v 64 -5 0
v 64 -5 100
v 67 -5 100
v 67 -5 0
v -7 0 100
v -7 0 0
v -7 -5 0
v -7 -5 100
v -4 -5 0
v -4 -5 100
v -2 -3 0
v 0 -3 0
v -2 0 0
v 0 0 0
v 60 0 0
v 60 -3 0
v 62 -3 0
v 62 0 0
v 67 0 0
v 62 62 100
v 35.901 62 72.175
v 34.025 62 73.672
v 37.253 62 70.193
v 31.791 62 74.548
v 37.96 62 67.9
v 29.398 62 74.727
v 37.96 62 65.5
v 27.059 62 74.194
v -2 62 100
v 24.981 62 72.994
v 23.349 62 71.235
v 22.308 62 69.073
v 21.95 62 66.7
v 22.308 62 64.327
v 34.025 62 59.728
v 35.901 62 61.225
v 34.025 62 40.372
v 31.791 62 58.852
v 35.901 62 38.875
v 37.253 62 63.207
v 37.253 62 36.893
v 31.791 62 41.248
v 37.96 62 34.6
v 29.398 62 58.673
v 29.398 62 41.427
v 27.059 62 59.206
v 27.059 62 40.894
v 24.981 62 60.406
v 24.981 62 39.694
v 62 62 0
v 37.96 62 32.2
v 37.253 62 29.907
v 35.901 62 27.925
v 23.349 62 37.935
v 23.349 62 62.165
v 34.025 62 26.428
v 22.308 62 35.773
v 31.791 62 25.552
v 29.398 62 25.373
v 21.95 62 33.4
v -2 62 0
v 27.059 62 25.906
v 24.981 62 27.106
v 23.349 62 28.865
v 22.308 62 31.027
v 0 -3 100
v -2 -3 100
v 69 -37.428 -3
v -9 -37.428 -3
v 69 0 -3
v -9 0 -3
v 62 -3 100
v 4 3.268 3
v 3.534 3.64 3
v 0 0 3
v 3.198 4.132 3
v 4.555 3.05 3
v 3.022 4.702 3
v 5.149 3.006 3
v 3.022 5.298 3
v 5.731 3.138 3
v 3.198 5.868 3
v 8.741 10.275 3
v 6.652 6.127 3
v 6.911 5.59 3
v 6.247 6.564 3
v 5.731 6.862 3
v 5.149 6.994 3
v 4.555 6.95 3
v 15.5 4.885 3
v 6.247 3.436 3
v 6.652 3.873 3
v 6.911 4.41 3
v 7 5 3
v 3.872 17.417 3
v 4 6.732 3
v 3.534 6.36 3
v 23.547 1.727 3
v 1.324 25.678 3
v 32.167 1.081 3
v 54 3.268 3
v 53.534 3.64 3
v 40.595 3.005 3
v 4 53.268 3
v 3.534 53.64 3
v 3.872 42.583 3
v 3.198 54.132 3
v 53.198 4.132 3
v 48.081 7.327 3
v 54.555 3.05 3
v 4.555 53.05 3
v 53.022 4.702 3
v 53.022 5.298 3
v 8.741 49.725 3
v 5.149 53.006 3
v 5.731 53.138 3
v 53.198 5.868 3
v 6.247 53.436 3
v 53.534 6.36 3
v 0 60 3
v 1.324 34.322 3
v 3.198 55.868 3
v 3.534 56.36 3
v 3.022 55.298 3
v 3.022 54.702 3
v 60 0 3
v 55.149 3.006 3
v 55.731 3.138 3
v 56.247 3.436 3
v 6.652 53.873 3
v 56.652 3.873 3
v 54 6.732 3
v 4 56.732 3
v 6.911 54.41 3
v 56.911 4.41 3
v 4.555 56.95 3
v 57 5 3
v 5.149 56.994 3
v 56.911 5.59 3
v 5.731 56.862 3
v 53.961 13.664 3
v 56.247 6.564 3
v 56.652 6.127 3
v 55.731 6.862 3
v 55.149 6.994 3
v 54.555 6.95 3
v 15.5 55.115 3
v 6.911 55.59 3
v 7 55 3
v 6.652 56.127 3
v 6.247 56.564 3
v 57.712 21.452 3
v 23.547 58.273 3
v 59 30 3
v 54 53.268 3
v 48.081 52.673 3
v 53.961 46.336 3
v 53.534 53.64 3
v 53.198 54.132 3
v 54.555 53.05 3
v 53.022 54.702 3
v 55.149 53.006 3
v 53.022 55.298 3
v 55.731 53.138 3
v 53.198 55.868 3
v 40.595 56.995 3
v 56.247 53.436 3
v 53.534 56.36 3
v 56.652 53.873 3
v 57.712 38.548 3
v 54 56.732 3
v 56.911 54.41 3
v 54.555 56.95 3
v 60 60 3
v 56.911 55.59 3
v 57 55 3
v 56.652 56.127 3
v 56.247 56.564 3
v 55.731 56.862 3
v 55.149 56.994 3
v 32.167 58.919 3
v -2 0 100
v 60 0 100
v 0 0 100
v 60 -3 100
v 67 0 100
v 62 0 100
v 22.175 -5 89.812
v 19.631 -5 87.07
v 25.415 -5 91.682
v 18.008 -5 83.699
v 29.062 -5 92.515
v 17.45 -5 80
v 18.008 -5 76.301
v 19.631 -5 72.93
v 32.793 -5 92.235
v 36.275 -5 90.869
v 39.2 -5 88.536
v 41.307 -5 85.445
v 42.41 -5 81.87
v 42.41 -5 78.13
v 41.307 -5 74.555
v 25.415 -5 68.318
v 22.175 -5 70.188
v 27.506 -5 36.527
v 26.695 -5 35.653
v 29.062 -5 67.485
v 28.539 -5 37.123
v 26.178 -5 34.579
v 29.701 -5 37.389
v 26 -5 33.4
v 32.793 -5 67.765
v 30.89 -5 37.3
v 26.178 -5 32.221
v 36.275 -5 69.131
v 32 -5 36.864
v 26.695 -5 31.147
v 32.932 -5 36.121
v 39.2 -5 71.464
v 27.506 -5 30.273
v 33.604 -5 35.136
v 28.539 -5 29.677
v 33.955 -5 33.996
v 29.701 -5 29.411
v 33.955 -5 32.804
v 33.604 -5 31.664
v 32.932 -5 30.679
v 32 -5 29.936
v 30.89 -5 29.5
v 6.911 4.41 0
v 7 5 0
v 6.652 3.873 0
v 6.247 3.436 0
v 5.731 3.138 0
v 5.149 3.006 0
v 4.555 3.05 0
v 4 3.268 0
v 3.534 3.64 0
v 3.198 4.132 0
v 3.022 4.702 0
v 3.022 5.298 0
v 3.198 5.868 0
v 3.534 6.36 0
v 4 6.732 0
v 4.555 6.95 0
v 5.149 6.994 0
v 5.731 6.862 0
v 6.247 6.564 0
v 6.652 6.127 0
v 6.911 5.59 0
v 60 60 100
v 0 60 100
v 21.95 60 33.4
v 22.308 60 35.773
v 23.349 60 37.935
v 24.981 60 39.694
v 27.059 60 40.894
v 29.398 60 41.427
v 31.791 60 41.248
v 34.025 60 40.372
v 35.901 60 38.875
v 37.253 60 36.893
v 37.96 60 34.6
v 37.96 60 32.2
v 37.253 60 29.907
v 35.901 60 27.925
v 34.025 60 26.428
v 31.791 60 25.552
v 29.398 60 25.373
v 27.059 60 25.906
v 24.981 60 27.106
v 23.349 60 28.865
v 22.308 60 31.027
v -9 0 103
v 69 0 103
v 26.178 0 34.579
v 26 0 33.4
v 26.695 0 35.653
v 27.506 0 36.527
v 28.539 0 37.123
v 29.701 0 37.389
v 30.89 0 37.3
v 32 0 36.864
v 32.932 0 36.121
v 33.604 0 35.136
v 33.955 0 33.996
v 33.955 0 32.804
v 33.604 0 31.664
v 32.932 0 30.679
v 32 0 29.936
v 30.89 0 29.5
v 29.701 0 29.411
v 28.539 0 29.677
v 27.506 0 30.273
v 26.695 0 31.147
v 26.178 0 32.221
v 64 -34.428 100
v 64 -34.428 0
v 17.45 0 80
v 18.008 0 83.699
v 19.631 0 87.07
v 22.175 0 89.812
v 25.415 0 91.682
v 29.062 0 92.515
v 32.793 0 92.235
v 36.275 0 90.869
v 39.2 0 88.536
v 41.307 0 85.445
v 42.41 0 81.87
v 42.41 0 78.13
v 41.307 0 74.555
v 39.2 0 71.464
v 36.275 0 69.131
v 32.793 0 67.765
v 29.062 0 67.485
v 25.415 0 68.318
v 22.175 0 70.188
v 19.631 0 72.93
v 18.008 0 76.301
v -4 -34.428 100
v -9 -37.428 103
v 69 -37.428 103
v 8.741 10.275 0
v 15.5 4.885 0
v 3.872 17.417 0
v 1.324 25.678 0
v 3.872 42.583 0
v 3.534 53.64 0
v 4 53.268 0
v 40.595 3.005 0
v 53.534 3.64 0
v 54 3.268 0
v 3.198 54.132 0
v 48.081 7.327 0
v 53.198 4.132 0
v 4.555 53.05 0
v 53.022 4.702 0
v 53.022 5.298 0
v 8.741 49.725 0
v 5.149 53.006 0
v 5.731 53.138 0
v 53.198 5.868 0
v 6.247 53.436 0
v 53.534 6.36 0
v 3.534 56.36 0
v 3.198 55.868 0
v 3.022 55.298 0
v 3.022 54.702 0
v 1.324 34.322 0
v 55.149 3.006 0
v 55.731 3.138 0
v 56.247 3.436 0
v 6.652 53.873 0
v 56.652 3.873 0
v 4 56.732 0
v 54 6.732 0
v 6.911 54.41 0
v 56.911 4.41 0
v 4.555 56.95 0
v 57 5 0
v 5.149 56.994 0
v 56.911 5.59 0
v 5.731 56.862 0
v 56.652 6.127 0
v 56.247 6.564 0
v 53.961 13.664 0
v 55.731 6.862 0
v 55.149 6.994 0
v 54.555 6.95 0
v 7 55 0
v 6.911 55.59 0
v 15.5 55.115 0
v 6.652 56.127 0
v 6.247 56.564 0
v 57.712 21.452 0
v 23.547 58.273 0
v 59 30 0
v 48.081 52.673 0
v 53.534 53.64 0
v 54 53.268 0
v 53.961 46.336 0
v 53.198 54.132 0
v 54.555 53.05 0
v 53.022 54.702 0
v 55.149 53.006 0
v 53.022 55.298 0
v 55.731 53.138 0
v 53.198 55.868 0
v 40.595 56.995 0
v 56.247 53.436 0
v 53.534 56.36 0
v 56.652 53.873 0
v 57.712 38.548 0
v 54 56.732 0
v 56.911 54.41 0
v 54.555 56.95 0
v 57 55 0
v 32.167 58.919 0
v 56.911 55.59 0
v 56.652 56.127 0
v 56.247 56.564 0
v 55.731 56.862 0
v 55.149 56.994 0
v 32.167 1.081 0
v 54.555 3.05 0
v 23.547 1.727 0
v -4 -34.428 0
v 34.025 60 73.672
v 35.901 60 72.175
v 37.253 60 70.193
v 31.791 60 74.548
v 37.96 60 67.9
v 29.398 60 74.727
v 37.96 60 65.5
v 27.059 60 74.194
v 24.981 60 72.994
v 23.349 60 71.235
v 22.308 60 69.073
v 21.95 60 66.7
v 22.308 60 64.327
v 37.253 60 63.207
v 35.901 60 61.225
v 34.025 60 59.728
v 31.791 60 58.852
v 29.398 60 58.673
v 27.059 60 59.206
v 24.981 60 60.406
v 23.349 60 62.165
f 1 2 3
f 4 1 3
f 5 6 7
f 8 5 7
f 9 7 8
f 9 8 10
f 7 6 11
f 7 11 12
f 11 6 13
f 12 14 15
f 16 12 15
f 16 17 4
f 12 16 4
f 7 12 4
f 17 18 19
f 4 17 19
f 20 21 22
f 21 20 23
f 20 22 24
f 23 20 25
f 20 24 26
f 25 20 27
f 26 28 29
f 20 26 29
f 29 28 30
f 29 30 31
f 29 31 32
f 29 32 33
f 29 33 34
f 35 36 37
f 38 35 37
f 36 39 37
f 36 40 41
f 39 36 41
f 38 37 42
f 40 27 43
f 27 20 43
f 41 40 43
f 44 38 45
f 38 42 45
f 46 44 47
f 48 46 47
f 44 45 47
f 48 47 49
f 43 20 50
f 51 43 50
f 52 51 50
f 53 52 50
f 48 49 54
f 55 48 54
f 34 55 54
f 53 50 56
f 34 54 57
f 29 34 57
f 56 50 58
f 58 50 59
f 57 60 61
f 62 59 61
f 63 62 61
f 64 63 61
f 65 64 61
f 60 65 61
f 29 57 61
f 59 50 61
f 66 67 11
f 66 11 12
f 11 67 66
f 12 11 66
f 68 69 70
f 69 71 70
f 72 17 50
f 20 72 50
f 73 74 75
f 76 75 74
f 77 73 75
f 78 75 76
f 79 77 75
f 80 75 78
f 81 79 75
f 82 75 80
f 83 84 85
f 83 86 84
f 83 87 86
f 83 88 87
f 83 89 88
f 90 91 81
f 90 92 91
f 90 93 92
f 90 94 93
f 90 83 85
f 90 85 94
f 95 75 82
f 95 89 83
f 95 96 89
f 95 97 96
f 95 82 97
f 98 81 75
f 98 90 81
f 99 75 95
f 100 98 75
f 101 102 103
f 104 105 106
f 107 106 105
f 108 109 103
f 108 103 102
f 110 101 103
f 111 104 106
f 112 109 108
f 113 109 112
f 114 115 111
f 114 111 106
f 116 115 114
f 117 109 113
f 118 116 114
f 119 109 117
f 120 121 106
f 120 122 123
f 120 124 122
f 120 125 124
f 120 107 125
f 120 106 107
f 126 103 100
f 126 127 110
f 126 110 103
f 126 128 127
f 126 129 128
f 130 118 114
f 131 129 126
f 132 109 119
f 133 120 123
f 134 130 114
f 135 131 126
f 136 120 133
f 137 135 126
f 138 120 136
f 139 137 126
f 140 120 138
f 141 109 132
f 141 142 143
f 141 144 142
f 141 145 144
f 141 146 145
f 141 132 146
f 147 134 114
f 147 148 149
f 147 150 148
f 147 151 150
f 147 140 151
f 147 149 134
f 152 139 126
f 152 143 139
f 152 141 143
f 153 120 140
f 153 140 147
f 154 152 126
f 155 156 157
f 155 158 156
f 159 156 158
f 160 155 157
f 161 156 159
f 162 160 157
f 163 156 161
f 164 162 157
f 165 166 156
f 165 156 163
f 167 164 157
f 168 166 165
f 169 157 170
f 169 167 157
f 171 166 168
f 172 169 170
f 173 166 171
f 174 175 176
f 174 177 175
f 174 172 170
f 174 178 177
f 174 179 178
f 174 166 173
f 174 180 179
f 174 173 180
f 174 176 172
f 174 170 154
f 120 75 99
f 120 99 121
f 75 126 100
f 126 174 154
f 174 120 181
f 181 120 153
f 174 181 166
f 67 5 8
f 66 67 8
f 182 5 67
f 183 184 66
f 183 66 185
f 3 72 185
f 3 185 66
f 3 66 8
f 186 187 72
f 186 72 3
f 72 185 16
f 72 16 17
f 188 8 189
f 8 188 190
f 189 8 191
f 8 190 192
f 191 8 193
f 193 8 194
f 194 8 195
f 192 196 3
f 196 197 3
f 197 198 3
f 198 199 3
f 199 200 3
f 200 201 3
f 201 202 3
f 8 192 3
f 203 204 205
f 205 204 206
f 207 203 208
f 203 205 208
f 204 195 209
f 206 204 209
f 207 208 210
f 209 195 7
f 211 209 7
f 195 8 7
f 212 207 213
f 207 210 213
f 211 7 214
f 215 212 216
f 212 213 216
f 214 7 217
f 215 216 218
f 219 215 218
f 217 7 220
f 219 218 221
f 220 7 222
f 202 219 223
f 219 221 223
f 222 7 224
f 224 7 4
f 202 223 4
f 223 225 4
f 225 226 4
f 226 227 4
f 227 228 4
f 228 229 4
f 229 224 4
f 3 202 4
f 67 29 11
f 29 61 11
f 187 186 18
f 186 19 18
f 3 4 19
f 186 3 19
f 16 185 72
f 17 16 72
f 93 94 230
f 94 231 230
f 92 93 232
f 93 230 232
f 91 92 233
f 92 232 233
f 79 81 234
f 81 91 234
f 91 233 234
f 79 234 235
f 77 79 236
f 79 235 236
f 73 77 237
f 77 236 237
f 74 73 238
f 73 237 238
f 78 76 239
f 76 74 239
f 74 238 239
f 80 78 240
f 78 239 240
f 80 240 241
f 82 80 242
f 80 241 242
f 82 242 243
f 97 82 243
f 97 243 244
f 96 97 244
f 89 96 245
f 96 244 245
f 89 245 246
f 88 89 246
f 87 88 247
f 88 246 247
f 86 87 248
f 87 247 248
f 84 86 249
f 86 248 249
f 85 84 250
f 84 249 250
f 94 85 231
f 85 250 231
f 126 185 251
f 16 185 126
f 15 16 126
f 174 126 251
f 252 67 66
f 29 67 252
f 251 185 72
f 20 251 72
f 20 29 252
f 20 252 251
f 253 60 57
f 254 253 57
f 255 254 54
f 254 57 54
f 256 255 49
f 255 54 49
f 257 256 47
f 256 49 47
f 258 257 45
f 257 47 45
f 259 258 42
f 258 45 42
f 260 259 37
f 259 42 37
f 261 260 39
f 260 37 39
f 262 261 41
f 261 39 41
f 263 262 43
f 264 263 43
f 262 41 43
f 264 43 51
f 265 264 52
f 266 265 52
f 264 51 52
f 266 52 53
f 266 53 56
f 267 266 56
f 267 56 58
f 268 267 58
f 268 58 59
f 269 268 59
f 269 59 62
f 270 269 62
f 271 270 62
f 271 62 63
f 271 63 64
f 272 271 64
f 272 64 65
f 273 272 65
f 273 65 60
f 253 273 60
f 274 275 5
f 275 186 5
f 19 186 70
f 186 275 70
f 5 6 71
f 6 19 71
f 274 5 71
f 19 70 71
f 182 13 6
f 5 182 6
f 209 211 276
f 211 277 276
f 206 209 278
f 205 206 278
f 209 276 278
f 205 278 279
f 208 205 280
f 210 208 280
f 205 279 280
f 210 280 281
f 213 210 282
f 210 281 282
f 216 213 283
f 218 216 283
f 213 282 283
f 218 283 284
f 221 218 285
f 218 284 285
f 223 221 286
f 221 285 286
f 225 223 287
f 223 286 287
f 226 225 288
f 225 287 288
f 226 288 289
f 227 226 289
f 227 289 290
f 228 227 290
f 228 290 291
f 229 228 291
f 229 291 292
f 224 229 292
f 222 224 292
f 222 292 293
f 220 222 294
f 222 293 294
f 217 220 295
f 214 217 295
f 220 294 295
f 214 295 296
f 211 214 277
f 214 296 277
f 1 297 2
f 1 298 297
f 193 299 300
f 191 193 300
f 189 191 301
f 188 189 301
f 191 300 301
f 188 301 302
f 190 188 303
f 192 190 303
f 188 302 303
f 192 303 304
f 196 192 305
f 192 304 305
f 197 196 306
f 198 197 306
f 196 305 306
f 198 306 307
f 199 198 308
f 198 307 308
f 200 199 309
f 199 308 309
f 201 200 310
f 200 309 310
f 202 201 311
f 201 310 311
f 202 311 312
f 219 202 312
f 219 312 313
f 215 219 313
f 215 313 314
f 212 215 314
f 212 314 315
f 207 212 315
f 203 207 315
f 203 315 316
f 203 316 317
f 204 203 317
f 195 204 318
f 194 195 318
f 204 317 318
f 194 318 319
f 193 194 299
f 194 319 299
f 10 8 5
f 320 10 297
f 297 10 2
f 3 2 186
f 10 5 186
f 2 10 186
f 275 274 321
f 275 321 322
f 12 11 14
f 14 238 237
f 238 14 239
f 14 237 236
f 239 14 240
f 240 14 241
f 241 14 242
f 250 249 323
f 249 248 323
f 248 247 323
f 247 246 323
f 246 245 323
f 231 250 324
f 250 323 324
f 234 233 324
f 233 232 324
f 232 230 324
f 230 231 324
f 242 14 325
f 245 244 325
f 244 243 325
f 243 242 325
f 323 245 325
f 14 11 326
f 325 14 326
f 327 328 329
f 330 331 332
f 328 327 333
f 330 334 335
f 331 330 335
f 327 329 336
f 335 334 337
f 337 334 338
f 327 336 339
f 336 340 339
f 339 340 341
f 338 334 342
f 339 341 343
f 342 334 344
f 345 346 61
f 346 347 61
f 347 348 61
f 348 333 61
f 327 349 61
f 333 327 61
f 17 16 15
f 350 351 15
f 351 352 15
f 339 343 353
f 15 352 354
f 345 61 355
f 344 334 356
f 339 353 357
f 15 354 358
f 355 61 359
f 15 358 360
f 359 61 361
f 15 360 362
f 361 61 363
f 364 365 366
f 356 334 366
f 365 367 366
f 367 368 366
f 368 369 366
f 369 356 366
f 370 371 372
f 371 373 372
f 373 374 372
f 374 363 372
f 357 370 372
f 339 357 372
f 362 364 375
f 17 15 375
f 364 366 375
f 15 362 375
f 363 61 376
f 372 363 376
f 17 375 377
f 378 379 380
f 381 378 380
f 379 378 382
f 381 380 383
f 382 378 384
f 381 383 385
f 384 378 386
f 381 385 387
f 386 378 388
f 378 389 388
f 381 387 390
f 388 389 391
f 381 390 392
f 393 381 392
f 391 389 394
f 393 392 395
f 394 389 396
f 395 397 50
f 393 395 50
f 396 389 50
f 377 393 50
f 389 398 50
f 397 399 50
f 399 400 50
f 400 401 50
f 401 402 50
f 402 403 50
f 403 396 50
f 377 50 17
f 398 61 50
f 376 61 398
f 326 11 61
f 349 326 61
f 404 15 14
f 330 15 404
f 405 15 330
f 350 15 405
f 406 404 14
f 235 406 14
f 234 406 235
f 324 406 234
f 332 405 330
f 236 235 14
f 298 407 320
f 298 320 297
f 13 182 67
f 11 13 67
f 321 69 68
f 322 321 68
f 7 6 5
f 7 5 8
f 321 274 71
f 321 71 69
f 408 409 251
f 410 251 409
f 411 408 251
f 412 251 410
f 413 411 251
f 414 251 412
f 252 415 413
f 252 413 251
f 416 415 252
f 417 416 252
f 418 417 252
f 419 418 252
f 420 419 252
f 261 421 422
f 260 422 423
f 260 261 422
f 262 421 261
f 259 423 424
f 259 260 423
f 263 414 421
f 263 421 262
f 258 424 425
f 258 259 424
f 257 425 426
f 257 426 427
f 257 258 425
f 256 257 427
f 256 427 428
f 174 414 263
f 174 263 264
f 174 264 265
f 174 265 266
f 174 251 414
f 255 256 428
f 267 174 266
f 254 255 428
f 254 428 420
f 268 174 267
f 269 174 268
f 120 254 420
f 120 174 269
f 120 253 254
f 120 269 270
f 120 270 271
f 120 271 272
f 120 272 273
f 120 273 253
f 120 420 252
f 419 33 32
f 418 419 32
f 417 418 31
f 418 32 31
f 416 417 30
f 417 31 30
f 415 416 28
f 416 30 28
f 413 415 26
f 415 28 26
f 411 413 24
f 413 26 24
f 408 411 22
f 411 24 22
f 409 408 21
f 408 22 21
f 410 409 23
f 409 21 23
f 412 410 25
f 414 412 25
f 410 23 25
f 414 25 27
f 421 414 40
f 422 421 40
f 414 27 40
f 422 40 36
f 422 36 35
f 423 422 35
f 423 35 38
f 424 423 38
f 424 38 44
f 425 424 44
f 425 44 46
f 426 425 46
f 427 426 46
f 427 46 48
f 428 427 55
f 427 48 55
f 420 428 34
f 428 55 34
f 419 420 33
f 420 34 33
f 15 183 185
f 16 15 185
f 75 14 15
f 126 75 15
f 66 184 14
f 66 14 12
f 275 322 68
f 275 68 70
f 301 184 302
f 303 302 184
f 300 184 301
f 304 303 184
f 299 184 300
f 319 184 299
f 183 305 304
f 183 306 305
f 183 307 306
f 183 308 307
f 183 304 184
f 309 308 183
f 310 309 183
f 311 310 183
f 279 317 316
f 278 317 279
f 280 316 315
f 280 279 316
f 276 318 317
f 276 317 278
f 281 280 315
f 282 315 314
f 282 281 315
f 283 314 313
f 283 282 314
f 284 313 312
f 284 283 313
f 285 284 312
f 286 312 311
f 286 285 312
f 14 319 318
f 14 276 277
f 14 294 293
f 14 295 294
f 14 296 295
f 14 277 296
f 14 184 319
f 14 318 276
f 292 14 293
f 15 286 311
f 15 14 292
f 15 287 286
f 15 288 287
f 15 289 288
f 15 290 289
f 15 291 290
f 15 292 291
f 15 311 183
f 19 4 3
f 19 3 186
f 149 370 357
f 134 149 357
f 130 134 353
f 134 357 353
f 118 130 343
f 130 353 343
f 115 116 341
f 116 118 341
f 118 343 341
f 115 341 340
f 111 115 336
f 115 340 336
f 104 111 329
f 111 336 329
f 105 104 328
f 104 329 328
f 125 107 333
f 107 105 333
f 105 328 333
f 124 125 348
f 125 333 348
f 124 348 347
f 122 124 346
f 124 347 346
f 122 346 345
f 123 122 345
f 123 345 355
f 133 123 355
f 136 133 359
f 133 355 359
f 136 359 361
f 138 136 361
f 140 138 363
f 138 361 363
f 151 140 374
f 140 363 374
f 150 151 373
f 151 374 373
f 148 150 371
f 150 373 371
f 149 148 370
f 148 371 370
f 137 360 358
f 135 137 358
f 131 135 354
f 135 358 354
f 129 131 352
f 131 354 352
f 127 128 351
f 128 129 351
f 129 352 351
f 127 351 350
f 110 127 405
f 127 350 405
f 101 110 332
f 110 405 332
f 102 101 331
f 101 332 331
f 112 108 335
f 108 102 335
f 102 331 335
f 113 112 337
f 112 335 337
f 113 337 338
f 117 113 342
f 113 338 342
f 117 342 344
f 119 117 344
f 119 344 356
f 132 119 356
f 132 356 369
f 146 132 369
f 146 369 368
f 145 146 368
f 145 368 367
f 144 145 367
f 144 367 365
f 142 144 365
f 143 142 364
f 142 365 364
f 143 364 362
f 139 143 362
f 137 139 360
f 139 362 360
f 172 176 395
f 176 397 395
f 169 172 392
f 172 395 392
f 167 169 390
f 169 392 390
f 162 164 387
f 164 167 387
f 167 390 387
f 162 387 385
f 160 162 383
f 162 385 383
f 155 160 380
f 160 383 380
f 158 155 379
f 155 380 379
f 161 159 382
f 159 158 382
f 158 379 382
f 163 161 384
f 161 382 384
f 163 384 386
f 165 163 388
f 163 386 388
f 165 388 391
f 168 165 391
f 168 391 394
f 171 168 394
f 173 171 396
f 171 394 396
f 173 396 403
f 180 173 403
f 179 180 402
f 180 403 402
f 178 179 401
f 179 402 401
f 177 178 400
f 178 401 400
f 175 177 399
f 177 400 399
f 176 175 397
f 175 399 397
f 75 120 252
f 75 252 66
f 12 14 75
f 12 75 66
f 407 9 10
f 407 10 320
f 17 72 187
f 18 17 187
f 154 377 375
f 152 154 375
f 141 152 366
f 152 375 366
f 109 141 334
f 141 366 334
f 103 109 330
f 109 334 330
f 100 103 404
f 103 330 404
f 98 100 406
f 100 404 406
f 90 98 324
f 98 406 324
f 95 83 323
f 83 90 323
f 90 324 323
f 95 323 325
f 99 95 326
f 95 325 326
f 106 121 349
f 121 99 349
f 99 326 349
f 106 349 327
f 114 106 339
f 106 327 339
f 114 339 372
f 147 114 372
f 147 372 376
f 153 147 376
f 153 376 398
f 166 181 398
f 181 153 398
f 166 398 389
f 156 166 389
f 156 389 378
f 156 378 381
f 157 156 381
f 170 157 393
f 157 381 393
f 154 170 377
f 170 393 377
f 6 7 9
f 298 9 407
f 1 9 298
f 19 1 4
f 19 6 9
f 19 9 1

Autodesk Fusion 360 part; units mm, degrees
sketch "Esquisse1" plane through (0, 0, 0) normal (0, 0, 1) x (1, 0, 0)
  line L0 (0, 0) -> (60, 0)
  line L1 (60, 0) -> (60, 60)
  line L2 (60, 60) -> (0, 60)
  line L3 (0, 60) -> (0, 0)
  line L4 (-2, -3) -> (62, -3)
  line L5 (62, -3) -> (62, 62)
  line L6 (62, 62) -> (-2, 62)
  line L7 (-2, 62) -> (-2, -3)
  circle A0 centre (30, 30) radius 29
  circle A1 centre (5, 55) radius 2
  circle A2 centre (55, 55) radius 2
  circle A3 centre (5, 5) radius 2
  circle A4 centre (55, 5) radius 2
  line L8 (0, 0) -> (0, -3)
  line L9 (60, 0) -> (60, -3)
  line L10 (0, 0) -> (-2, 0)
  line L11 (60, 0) -> (62, 0)
  line L12 (-2, 0) -> (-7, 0)
  line L13 (-7, 0) -> (-7, -5)
  line L14 (-7, -5) -> (67, -5)
  line L15 (67, -5) -> (67, 0)
  line L16 (67, 0) -> (62, 0)
  line L17 (-7, 0) -> (-9, 0)
  line L18 (-9, 0) -> (-9, -37.428)
  line L19 (-9, -37.428) -> (69, -37.428)
  line L20 (69, -37.428) -> (69, 0)
  line L21 (69, 0) -> (67, 0)
  line L22 (-7, -5) -> (-3.362, -5)
  line L23 (-4, -5) -> (-4, -34.428)
  line L24 (-4, -34.428) -> (64, -34.428)
  line L25 (64, -34.428) -> (64, -5)
  line L26 (64, -5) -> (67, -5)
  dimension "d1" = 60
  dimension "d2" = 60
  dimension "d3" = 2
  dimension "d4" = 2
  dimension "d5" = 2
  dimension "d6" = 3
  dimension "d7" = 58
  dimension "d8" = 30
  dimension "d9" = 30
  dimension "d10" = 4
  dimension "d11" = 4
  dimension "d12" = 4
  dimension "d13" = 4
  dimension "d14" = 5
  dimension "d15" = 5
  dimension "d16" = 5
  dimension "d17" = 5
  dimension "d18" = 5
  dimension "d19" = 5
  dimension "d20" = 5
  dimension "d21" = 5
  dimension "d51" = 5
  dimension "d52" = 5
  dimension "d53" = 2
  dimension "d56" = 2
  dimension "d57" = 2
  dimension "d58" = 5
  dimension "d59" = 3
  dimension "d60" = 5
extrude "Extrusion1" add sketch "Esquisse1" along normal blind 3 contours L0 L1 L2 L3 makes body 1
extrude "Extrusion2" add sketch "Esquisse1" along normal blind 100 and the other way blind 0 contours L1 L2 L3 L5 L6 L7 L10 L11 | L4 L7 L8 L10 | L4 L5 L9 L11 bodies 1
sketch "Esquisse3" plane through (0, 60, 0) normal (0, -1, 0) x (1, 0, 0)
  line L0 (0, 3) -> (60, 3)
  line L1 (60, 3) -> (60, 100)
  line L2 (60, 100) -> (0, 100)
  line L3 (0, 100) -> (0, 3)
  line L4 (44.0145, 78.9655) -> (49.4524, 81.5012)
  line L5 (49.4524, 81.5012) -> (41, 99.6274)
  line L6 (41, 99.6274) -> (35.5622, 97.0917)
  line L7 (35.5622, 97.0917) -> (44.0145, 78.9655)
  dimension "d37" = 20
  dimension "d38" = 6
  dimension "d39" = 25
  dimension "d40" = 19
extrude "Extrusion5" add sketch "Esquisse1" along normal blind 100 and the other way blind 0 separate body contours L0 L4 L8 L9 | L4 L5 L7 L12 L13 L14 L15 L16 L22 L26 makes body 2
extrude "Extrusion6" add sketch "Esquisse1" along normal blind 100 and the other way blind 0 separate body contours L13 L14 L15 L17 L18 L19 L20 L21 L22 L23 L24 L25 L26 makes body 3
sketch "Esquisse4" plane through (0, 0, 0) normal (0, 1, 0) x (-1, 0, 0)
  line L0 (0, 0) -> (0, 100)
  line L1 (0, 100) -> (-60, 100)
  line L2 (-60, 100) -> (-60, 0)
  line L3 (-60, 0) -> (0, 0)
  circle A0 centre (-30, 33.4) radius 4
  circle A1 centre (-30, 80) radius 12.55
  dimension "d90" = 8
  dimension "d91" = 25.1
  dimension "d92" = 20
  dimension "d93" = 30
  dimension "d94" = 30
  dimension "d95" = 66.6
sketch "Esquisse5" plane through (0, 62, 0) normal (0, 1, 0) x (-1, 0, 0)
  line L0 (2, 0) -> (2, 100)
  line L1 (2, 100) -> (-62, 100)
  line L2 (-62, 100) -> (-62, 0)
  line L3 (-62, 0) -> (2, 0)
  circle A0 centre (-30, 33.4) radius 8.05
  line L4 (0, 0) -> (0, 100)
  circle A1 centre (-30, 66.7) radius 8.05
  dimension "d81" = 16.1
  dimension "d83" = 30
  dimension "d84" = 66.6
  dimension "d85" = 16.1
  dimension "d86" = 30
  dimension "d87" = 33.3
extrude "Extrusion11" cut sketch "Esquisse5" against normal blind 5 contours A0 | A1 bodies 1
extrude "Extrusion12" cut sketch "Esquisse4" against normal blind 5 contours A0 | A1 bodies 2
extrude "Extrusion13" add sketch "Esquisse1" against normal blind 3 contours L0 L4 L8 L9 | L4 L7 L8 L10 | L4 L5 L9 L11 | L4 L5 L7 L12 L13 L14 L15 L16 L22 L26 | L13 L14 L15 L17 L18 L19 L20 L21 L22 L23 L24 L25 L26 | L14 L22 L23 L24 L25 bodies 3
extrude "Extrusion14" add sketch "Esquisse1" along normal blind 3 from surface at 100 contours L0 L4 L8 L9 | L4 L7 L8 L10 | L4 L5 L9 L11 | L4 L5 L7 L12 L13 L14 L15 L16 L22 L26 | L13 L14 L15 L17 L18 L19 L20 L21 L22 L23 L24 L25 L26 | L14 L22 L23 L24 L25 bodies 3
